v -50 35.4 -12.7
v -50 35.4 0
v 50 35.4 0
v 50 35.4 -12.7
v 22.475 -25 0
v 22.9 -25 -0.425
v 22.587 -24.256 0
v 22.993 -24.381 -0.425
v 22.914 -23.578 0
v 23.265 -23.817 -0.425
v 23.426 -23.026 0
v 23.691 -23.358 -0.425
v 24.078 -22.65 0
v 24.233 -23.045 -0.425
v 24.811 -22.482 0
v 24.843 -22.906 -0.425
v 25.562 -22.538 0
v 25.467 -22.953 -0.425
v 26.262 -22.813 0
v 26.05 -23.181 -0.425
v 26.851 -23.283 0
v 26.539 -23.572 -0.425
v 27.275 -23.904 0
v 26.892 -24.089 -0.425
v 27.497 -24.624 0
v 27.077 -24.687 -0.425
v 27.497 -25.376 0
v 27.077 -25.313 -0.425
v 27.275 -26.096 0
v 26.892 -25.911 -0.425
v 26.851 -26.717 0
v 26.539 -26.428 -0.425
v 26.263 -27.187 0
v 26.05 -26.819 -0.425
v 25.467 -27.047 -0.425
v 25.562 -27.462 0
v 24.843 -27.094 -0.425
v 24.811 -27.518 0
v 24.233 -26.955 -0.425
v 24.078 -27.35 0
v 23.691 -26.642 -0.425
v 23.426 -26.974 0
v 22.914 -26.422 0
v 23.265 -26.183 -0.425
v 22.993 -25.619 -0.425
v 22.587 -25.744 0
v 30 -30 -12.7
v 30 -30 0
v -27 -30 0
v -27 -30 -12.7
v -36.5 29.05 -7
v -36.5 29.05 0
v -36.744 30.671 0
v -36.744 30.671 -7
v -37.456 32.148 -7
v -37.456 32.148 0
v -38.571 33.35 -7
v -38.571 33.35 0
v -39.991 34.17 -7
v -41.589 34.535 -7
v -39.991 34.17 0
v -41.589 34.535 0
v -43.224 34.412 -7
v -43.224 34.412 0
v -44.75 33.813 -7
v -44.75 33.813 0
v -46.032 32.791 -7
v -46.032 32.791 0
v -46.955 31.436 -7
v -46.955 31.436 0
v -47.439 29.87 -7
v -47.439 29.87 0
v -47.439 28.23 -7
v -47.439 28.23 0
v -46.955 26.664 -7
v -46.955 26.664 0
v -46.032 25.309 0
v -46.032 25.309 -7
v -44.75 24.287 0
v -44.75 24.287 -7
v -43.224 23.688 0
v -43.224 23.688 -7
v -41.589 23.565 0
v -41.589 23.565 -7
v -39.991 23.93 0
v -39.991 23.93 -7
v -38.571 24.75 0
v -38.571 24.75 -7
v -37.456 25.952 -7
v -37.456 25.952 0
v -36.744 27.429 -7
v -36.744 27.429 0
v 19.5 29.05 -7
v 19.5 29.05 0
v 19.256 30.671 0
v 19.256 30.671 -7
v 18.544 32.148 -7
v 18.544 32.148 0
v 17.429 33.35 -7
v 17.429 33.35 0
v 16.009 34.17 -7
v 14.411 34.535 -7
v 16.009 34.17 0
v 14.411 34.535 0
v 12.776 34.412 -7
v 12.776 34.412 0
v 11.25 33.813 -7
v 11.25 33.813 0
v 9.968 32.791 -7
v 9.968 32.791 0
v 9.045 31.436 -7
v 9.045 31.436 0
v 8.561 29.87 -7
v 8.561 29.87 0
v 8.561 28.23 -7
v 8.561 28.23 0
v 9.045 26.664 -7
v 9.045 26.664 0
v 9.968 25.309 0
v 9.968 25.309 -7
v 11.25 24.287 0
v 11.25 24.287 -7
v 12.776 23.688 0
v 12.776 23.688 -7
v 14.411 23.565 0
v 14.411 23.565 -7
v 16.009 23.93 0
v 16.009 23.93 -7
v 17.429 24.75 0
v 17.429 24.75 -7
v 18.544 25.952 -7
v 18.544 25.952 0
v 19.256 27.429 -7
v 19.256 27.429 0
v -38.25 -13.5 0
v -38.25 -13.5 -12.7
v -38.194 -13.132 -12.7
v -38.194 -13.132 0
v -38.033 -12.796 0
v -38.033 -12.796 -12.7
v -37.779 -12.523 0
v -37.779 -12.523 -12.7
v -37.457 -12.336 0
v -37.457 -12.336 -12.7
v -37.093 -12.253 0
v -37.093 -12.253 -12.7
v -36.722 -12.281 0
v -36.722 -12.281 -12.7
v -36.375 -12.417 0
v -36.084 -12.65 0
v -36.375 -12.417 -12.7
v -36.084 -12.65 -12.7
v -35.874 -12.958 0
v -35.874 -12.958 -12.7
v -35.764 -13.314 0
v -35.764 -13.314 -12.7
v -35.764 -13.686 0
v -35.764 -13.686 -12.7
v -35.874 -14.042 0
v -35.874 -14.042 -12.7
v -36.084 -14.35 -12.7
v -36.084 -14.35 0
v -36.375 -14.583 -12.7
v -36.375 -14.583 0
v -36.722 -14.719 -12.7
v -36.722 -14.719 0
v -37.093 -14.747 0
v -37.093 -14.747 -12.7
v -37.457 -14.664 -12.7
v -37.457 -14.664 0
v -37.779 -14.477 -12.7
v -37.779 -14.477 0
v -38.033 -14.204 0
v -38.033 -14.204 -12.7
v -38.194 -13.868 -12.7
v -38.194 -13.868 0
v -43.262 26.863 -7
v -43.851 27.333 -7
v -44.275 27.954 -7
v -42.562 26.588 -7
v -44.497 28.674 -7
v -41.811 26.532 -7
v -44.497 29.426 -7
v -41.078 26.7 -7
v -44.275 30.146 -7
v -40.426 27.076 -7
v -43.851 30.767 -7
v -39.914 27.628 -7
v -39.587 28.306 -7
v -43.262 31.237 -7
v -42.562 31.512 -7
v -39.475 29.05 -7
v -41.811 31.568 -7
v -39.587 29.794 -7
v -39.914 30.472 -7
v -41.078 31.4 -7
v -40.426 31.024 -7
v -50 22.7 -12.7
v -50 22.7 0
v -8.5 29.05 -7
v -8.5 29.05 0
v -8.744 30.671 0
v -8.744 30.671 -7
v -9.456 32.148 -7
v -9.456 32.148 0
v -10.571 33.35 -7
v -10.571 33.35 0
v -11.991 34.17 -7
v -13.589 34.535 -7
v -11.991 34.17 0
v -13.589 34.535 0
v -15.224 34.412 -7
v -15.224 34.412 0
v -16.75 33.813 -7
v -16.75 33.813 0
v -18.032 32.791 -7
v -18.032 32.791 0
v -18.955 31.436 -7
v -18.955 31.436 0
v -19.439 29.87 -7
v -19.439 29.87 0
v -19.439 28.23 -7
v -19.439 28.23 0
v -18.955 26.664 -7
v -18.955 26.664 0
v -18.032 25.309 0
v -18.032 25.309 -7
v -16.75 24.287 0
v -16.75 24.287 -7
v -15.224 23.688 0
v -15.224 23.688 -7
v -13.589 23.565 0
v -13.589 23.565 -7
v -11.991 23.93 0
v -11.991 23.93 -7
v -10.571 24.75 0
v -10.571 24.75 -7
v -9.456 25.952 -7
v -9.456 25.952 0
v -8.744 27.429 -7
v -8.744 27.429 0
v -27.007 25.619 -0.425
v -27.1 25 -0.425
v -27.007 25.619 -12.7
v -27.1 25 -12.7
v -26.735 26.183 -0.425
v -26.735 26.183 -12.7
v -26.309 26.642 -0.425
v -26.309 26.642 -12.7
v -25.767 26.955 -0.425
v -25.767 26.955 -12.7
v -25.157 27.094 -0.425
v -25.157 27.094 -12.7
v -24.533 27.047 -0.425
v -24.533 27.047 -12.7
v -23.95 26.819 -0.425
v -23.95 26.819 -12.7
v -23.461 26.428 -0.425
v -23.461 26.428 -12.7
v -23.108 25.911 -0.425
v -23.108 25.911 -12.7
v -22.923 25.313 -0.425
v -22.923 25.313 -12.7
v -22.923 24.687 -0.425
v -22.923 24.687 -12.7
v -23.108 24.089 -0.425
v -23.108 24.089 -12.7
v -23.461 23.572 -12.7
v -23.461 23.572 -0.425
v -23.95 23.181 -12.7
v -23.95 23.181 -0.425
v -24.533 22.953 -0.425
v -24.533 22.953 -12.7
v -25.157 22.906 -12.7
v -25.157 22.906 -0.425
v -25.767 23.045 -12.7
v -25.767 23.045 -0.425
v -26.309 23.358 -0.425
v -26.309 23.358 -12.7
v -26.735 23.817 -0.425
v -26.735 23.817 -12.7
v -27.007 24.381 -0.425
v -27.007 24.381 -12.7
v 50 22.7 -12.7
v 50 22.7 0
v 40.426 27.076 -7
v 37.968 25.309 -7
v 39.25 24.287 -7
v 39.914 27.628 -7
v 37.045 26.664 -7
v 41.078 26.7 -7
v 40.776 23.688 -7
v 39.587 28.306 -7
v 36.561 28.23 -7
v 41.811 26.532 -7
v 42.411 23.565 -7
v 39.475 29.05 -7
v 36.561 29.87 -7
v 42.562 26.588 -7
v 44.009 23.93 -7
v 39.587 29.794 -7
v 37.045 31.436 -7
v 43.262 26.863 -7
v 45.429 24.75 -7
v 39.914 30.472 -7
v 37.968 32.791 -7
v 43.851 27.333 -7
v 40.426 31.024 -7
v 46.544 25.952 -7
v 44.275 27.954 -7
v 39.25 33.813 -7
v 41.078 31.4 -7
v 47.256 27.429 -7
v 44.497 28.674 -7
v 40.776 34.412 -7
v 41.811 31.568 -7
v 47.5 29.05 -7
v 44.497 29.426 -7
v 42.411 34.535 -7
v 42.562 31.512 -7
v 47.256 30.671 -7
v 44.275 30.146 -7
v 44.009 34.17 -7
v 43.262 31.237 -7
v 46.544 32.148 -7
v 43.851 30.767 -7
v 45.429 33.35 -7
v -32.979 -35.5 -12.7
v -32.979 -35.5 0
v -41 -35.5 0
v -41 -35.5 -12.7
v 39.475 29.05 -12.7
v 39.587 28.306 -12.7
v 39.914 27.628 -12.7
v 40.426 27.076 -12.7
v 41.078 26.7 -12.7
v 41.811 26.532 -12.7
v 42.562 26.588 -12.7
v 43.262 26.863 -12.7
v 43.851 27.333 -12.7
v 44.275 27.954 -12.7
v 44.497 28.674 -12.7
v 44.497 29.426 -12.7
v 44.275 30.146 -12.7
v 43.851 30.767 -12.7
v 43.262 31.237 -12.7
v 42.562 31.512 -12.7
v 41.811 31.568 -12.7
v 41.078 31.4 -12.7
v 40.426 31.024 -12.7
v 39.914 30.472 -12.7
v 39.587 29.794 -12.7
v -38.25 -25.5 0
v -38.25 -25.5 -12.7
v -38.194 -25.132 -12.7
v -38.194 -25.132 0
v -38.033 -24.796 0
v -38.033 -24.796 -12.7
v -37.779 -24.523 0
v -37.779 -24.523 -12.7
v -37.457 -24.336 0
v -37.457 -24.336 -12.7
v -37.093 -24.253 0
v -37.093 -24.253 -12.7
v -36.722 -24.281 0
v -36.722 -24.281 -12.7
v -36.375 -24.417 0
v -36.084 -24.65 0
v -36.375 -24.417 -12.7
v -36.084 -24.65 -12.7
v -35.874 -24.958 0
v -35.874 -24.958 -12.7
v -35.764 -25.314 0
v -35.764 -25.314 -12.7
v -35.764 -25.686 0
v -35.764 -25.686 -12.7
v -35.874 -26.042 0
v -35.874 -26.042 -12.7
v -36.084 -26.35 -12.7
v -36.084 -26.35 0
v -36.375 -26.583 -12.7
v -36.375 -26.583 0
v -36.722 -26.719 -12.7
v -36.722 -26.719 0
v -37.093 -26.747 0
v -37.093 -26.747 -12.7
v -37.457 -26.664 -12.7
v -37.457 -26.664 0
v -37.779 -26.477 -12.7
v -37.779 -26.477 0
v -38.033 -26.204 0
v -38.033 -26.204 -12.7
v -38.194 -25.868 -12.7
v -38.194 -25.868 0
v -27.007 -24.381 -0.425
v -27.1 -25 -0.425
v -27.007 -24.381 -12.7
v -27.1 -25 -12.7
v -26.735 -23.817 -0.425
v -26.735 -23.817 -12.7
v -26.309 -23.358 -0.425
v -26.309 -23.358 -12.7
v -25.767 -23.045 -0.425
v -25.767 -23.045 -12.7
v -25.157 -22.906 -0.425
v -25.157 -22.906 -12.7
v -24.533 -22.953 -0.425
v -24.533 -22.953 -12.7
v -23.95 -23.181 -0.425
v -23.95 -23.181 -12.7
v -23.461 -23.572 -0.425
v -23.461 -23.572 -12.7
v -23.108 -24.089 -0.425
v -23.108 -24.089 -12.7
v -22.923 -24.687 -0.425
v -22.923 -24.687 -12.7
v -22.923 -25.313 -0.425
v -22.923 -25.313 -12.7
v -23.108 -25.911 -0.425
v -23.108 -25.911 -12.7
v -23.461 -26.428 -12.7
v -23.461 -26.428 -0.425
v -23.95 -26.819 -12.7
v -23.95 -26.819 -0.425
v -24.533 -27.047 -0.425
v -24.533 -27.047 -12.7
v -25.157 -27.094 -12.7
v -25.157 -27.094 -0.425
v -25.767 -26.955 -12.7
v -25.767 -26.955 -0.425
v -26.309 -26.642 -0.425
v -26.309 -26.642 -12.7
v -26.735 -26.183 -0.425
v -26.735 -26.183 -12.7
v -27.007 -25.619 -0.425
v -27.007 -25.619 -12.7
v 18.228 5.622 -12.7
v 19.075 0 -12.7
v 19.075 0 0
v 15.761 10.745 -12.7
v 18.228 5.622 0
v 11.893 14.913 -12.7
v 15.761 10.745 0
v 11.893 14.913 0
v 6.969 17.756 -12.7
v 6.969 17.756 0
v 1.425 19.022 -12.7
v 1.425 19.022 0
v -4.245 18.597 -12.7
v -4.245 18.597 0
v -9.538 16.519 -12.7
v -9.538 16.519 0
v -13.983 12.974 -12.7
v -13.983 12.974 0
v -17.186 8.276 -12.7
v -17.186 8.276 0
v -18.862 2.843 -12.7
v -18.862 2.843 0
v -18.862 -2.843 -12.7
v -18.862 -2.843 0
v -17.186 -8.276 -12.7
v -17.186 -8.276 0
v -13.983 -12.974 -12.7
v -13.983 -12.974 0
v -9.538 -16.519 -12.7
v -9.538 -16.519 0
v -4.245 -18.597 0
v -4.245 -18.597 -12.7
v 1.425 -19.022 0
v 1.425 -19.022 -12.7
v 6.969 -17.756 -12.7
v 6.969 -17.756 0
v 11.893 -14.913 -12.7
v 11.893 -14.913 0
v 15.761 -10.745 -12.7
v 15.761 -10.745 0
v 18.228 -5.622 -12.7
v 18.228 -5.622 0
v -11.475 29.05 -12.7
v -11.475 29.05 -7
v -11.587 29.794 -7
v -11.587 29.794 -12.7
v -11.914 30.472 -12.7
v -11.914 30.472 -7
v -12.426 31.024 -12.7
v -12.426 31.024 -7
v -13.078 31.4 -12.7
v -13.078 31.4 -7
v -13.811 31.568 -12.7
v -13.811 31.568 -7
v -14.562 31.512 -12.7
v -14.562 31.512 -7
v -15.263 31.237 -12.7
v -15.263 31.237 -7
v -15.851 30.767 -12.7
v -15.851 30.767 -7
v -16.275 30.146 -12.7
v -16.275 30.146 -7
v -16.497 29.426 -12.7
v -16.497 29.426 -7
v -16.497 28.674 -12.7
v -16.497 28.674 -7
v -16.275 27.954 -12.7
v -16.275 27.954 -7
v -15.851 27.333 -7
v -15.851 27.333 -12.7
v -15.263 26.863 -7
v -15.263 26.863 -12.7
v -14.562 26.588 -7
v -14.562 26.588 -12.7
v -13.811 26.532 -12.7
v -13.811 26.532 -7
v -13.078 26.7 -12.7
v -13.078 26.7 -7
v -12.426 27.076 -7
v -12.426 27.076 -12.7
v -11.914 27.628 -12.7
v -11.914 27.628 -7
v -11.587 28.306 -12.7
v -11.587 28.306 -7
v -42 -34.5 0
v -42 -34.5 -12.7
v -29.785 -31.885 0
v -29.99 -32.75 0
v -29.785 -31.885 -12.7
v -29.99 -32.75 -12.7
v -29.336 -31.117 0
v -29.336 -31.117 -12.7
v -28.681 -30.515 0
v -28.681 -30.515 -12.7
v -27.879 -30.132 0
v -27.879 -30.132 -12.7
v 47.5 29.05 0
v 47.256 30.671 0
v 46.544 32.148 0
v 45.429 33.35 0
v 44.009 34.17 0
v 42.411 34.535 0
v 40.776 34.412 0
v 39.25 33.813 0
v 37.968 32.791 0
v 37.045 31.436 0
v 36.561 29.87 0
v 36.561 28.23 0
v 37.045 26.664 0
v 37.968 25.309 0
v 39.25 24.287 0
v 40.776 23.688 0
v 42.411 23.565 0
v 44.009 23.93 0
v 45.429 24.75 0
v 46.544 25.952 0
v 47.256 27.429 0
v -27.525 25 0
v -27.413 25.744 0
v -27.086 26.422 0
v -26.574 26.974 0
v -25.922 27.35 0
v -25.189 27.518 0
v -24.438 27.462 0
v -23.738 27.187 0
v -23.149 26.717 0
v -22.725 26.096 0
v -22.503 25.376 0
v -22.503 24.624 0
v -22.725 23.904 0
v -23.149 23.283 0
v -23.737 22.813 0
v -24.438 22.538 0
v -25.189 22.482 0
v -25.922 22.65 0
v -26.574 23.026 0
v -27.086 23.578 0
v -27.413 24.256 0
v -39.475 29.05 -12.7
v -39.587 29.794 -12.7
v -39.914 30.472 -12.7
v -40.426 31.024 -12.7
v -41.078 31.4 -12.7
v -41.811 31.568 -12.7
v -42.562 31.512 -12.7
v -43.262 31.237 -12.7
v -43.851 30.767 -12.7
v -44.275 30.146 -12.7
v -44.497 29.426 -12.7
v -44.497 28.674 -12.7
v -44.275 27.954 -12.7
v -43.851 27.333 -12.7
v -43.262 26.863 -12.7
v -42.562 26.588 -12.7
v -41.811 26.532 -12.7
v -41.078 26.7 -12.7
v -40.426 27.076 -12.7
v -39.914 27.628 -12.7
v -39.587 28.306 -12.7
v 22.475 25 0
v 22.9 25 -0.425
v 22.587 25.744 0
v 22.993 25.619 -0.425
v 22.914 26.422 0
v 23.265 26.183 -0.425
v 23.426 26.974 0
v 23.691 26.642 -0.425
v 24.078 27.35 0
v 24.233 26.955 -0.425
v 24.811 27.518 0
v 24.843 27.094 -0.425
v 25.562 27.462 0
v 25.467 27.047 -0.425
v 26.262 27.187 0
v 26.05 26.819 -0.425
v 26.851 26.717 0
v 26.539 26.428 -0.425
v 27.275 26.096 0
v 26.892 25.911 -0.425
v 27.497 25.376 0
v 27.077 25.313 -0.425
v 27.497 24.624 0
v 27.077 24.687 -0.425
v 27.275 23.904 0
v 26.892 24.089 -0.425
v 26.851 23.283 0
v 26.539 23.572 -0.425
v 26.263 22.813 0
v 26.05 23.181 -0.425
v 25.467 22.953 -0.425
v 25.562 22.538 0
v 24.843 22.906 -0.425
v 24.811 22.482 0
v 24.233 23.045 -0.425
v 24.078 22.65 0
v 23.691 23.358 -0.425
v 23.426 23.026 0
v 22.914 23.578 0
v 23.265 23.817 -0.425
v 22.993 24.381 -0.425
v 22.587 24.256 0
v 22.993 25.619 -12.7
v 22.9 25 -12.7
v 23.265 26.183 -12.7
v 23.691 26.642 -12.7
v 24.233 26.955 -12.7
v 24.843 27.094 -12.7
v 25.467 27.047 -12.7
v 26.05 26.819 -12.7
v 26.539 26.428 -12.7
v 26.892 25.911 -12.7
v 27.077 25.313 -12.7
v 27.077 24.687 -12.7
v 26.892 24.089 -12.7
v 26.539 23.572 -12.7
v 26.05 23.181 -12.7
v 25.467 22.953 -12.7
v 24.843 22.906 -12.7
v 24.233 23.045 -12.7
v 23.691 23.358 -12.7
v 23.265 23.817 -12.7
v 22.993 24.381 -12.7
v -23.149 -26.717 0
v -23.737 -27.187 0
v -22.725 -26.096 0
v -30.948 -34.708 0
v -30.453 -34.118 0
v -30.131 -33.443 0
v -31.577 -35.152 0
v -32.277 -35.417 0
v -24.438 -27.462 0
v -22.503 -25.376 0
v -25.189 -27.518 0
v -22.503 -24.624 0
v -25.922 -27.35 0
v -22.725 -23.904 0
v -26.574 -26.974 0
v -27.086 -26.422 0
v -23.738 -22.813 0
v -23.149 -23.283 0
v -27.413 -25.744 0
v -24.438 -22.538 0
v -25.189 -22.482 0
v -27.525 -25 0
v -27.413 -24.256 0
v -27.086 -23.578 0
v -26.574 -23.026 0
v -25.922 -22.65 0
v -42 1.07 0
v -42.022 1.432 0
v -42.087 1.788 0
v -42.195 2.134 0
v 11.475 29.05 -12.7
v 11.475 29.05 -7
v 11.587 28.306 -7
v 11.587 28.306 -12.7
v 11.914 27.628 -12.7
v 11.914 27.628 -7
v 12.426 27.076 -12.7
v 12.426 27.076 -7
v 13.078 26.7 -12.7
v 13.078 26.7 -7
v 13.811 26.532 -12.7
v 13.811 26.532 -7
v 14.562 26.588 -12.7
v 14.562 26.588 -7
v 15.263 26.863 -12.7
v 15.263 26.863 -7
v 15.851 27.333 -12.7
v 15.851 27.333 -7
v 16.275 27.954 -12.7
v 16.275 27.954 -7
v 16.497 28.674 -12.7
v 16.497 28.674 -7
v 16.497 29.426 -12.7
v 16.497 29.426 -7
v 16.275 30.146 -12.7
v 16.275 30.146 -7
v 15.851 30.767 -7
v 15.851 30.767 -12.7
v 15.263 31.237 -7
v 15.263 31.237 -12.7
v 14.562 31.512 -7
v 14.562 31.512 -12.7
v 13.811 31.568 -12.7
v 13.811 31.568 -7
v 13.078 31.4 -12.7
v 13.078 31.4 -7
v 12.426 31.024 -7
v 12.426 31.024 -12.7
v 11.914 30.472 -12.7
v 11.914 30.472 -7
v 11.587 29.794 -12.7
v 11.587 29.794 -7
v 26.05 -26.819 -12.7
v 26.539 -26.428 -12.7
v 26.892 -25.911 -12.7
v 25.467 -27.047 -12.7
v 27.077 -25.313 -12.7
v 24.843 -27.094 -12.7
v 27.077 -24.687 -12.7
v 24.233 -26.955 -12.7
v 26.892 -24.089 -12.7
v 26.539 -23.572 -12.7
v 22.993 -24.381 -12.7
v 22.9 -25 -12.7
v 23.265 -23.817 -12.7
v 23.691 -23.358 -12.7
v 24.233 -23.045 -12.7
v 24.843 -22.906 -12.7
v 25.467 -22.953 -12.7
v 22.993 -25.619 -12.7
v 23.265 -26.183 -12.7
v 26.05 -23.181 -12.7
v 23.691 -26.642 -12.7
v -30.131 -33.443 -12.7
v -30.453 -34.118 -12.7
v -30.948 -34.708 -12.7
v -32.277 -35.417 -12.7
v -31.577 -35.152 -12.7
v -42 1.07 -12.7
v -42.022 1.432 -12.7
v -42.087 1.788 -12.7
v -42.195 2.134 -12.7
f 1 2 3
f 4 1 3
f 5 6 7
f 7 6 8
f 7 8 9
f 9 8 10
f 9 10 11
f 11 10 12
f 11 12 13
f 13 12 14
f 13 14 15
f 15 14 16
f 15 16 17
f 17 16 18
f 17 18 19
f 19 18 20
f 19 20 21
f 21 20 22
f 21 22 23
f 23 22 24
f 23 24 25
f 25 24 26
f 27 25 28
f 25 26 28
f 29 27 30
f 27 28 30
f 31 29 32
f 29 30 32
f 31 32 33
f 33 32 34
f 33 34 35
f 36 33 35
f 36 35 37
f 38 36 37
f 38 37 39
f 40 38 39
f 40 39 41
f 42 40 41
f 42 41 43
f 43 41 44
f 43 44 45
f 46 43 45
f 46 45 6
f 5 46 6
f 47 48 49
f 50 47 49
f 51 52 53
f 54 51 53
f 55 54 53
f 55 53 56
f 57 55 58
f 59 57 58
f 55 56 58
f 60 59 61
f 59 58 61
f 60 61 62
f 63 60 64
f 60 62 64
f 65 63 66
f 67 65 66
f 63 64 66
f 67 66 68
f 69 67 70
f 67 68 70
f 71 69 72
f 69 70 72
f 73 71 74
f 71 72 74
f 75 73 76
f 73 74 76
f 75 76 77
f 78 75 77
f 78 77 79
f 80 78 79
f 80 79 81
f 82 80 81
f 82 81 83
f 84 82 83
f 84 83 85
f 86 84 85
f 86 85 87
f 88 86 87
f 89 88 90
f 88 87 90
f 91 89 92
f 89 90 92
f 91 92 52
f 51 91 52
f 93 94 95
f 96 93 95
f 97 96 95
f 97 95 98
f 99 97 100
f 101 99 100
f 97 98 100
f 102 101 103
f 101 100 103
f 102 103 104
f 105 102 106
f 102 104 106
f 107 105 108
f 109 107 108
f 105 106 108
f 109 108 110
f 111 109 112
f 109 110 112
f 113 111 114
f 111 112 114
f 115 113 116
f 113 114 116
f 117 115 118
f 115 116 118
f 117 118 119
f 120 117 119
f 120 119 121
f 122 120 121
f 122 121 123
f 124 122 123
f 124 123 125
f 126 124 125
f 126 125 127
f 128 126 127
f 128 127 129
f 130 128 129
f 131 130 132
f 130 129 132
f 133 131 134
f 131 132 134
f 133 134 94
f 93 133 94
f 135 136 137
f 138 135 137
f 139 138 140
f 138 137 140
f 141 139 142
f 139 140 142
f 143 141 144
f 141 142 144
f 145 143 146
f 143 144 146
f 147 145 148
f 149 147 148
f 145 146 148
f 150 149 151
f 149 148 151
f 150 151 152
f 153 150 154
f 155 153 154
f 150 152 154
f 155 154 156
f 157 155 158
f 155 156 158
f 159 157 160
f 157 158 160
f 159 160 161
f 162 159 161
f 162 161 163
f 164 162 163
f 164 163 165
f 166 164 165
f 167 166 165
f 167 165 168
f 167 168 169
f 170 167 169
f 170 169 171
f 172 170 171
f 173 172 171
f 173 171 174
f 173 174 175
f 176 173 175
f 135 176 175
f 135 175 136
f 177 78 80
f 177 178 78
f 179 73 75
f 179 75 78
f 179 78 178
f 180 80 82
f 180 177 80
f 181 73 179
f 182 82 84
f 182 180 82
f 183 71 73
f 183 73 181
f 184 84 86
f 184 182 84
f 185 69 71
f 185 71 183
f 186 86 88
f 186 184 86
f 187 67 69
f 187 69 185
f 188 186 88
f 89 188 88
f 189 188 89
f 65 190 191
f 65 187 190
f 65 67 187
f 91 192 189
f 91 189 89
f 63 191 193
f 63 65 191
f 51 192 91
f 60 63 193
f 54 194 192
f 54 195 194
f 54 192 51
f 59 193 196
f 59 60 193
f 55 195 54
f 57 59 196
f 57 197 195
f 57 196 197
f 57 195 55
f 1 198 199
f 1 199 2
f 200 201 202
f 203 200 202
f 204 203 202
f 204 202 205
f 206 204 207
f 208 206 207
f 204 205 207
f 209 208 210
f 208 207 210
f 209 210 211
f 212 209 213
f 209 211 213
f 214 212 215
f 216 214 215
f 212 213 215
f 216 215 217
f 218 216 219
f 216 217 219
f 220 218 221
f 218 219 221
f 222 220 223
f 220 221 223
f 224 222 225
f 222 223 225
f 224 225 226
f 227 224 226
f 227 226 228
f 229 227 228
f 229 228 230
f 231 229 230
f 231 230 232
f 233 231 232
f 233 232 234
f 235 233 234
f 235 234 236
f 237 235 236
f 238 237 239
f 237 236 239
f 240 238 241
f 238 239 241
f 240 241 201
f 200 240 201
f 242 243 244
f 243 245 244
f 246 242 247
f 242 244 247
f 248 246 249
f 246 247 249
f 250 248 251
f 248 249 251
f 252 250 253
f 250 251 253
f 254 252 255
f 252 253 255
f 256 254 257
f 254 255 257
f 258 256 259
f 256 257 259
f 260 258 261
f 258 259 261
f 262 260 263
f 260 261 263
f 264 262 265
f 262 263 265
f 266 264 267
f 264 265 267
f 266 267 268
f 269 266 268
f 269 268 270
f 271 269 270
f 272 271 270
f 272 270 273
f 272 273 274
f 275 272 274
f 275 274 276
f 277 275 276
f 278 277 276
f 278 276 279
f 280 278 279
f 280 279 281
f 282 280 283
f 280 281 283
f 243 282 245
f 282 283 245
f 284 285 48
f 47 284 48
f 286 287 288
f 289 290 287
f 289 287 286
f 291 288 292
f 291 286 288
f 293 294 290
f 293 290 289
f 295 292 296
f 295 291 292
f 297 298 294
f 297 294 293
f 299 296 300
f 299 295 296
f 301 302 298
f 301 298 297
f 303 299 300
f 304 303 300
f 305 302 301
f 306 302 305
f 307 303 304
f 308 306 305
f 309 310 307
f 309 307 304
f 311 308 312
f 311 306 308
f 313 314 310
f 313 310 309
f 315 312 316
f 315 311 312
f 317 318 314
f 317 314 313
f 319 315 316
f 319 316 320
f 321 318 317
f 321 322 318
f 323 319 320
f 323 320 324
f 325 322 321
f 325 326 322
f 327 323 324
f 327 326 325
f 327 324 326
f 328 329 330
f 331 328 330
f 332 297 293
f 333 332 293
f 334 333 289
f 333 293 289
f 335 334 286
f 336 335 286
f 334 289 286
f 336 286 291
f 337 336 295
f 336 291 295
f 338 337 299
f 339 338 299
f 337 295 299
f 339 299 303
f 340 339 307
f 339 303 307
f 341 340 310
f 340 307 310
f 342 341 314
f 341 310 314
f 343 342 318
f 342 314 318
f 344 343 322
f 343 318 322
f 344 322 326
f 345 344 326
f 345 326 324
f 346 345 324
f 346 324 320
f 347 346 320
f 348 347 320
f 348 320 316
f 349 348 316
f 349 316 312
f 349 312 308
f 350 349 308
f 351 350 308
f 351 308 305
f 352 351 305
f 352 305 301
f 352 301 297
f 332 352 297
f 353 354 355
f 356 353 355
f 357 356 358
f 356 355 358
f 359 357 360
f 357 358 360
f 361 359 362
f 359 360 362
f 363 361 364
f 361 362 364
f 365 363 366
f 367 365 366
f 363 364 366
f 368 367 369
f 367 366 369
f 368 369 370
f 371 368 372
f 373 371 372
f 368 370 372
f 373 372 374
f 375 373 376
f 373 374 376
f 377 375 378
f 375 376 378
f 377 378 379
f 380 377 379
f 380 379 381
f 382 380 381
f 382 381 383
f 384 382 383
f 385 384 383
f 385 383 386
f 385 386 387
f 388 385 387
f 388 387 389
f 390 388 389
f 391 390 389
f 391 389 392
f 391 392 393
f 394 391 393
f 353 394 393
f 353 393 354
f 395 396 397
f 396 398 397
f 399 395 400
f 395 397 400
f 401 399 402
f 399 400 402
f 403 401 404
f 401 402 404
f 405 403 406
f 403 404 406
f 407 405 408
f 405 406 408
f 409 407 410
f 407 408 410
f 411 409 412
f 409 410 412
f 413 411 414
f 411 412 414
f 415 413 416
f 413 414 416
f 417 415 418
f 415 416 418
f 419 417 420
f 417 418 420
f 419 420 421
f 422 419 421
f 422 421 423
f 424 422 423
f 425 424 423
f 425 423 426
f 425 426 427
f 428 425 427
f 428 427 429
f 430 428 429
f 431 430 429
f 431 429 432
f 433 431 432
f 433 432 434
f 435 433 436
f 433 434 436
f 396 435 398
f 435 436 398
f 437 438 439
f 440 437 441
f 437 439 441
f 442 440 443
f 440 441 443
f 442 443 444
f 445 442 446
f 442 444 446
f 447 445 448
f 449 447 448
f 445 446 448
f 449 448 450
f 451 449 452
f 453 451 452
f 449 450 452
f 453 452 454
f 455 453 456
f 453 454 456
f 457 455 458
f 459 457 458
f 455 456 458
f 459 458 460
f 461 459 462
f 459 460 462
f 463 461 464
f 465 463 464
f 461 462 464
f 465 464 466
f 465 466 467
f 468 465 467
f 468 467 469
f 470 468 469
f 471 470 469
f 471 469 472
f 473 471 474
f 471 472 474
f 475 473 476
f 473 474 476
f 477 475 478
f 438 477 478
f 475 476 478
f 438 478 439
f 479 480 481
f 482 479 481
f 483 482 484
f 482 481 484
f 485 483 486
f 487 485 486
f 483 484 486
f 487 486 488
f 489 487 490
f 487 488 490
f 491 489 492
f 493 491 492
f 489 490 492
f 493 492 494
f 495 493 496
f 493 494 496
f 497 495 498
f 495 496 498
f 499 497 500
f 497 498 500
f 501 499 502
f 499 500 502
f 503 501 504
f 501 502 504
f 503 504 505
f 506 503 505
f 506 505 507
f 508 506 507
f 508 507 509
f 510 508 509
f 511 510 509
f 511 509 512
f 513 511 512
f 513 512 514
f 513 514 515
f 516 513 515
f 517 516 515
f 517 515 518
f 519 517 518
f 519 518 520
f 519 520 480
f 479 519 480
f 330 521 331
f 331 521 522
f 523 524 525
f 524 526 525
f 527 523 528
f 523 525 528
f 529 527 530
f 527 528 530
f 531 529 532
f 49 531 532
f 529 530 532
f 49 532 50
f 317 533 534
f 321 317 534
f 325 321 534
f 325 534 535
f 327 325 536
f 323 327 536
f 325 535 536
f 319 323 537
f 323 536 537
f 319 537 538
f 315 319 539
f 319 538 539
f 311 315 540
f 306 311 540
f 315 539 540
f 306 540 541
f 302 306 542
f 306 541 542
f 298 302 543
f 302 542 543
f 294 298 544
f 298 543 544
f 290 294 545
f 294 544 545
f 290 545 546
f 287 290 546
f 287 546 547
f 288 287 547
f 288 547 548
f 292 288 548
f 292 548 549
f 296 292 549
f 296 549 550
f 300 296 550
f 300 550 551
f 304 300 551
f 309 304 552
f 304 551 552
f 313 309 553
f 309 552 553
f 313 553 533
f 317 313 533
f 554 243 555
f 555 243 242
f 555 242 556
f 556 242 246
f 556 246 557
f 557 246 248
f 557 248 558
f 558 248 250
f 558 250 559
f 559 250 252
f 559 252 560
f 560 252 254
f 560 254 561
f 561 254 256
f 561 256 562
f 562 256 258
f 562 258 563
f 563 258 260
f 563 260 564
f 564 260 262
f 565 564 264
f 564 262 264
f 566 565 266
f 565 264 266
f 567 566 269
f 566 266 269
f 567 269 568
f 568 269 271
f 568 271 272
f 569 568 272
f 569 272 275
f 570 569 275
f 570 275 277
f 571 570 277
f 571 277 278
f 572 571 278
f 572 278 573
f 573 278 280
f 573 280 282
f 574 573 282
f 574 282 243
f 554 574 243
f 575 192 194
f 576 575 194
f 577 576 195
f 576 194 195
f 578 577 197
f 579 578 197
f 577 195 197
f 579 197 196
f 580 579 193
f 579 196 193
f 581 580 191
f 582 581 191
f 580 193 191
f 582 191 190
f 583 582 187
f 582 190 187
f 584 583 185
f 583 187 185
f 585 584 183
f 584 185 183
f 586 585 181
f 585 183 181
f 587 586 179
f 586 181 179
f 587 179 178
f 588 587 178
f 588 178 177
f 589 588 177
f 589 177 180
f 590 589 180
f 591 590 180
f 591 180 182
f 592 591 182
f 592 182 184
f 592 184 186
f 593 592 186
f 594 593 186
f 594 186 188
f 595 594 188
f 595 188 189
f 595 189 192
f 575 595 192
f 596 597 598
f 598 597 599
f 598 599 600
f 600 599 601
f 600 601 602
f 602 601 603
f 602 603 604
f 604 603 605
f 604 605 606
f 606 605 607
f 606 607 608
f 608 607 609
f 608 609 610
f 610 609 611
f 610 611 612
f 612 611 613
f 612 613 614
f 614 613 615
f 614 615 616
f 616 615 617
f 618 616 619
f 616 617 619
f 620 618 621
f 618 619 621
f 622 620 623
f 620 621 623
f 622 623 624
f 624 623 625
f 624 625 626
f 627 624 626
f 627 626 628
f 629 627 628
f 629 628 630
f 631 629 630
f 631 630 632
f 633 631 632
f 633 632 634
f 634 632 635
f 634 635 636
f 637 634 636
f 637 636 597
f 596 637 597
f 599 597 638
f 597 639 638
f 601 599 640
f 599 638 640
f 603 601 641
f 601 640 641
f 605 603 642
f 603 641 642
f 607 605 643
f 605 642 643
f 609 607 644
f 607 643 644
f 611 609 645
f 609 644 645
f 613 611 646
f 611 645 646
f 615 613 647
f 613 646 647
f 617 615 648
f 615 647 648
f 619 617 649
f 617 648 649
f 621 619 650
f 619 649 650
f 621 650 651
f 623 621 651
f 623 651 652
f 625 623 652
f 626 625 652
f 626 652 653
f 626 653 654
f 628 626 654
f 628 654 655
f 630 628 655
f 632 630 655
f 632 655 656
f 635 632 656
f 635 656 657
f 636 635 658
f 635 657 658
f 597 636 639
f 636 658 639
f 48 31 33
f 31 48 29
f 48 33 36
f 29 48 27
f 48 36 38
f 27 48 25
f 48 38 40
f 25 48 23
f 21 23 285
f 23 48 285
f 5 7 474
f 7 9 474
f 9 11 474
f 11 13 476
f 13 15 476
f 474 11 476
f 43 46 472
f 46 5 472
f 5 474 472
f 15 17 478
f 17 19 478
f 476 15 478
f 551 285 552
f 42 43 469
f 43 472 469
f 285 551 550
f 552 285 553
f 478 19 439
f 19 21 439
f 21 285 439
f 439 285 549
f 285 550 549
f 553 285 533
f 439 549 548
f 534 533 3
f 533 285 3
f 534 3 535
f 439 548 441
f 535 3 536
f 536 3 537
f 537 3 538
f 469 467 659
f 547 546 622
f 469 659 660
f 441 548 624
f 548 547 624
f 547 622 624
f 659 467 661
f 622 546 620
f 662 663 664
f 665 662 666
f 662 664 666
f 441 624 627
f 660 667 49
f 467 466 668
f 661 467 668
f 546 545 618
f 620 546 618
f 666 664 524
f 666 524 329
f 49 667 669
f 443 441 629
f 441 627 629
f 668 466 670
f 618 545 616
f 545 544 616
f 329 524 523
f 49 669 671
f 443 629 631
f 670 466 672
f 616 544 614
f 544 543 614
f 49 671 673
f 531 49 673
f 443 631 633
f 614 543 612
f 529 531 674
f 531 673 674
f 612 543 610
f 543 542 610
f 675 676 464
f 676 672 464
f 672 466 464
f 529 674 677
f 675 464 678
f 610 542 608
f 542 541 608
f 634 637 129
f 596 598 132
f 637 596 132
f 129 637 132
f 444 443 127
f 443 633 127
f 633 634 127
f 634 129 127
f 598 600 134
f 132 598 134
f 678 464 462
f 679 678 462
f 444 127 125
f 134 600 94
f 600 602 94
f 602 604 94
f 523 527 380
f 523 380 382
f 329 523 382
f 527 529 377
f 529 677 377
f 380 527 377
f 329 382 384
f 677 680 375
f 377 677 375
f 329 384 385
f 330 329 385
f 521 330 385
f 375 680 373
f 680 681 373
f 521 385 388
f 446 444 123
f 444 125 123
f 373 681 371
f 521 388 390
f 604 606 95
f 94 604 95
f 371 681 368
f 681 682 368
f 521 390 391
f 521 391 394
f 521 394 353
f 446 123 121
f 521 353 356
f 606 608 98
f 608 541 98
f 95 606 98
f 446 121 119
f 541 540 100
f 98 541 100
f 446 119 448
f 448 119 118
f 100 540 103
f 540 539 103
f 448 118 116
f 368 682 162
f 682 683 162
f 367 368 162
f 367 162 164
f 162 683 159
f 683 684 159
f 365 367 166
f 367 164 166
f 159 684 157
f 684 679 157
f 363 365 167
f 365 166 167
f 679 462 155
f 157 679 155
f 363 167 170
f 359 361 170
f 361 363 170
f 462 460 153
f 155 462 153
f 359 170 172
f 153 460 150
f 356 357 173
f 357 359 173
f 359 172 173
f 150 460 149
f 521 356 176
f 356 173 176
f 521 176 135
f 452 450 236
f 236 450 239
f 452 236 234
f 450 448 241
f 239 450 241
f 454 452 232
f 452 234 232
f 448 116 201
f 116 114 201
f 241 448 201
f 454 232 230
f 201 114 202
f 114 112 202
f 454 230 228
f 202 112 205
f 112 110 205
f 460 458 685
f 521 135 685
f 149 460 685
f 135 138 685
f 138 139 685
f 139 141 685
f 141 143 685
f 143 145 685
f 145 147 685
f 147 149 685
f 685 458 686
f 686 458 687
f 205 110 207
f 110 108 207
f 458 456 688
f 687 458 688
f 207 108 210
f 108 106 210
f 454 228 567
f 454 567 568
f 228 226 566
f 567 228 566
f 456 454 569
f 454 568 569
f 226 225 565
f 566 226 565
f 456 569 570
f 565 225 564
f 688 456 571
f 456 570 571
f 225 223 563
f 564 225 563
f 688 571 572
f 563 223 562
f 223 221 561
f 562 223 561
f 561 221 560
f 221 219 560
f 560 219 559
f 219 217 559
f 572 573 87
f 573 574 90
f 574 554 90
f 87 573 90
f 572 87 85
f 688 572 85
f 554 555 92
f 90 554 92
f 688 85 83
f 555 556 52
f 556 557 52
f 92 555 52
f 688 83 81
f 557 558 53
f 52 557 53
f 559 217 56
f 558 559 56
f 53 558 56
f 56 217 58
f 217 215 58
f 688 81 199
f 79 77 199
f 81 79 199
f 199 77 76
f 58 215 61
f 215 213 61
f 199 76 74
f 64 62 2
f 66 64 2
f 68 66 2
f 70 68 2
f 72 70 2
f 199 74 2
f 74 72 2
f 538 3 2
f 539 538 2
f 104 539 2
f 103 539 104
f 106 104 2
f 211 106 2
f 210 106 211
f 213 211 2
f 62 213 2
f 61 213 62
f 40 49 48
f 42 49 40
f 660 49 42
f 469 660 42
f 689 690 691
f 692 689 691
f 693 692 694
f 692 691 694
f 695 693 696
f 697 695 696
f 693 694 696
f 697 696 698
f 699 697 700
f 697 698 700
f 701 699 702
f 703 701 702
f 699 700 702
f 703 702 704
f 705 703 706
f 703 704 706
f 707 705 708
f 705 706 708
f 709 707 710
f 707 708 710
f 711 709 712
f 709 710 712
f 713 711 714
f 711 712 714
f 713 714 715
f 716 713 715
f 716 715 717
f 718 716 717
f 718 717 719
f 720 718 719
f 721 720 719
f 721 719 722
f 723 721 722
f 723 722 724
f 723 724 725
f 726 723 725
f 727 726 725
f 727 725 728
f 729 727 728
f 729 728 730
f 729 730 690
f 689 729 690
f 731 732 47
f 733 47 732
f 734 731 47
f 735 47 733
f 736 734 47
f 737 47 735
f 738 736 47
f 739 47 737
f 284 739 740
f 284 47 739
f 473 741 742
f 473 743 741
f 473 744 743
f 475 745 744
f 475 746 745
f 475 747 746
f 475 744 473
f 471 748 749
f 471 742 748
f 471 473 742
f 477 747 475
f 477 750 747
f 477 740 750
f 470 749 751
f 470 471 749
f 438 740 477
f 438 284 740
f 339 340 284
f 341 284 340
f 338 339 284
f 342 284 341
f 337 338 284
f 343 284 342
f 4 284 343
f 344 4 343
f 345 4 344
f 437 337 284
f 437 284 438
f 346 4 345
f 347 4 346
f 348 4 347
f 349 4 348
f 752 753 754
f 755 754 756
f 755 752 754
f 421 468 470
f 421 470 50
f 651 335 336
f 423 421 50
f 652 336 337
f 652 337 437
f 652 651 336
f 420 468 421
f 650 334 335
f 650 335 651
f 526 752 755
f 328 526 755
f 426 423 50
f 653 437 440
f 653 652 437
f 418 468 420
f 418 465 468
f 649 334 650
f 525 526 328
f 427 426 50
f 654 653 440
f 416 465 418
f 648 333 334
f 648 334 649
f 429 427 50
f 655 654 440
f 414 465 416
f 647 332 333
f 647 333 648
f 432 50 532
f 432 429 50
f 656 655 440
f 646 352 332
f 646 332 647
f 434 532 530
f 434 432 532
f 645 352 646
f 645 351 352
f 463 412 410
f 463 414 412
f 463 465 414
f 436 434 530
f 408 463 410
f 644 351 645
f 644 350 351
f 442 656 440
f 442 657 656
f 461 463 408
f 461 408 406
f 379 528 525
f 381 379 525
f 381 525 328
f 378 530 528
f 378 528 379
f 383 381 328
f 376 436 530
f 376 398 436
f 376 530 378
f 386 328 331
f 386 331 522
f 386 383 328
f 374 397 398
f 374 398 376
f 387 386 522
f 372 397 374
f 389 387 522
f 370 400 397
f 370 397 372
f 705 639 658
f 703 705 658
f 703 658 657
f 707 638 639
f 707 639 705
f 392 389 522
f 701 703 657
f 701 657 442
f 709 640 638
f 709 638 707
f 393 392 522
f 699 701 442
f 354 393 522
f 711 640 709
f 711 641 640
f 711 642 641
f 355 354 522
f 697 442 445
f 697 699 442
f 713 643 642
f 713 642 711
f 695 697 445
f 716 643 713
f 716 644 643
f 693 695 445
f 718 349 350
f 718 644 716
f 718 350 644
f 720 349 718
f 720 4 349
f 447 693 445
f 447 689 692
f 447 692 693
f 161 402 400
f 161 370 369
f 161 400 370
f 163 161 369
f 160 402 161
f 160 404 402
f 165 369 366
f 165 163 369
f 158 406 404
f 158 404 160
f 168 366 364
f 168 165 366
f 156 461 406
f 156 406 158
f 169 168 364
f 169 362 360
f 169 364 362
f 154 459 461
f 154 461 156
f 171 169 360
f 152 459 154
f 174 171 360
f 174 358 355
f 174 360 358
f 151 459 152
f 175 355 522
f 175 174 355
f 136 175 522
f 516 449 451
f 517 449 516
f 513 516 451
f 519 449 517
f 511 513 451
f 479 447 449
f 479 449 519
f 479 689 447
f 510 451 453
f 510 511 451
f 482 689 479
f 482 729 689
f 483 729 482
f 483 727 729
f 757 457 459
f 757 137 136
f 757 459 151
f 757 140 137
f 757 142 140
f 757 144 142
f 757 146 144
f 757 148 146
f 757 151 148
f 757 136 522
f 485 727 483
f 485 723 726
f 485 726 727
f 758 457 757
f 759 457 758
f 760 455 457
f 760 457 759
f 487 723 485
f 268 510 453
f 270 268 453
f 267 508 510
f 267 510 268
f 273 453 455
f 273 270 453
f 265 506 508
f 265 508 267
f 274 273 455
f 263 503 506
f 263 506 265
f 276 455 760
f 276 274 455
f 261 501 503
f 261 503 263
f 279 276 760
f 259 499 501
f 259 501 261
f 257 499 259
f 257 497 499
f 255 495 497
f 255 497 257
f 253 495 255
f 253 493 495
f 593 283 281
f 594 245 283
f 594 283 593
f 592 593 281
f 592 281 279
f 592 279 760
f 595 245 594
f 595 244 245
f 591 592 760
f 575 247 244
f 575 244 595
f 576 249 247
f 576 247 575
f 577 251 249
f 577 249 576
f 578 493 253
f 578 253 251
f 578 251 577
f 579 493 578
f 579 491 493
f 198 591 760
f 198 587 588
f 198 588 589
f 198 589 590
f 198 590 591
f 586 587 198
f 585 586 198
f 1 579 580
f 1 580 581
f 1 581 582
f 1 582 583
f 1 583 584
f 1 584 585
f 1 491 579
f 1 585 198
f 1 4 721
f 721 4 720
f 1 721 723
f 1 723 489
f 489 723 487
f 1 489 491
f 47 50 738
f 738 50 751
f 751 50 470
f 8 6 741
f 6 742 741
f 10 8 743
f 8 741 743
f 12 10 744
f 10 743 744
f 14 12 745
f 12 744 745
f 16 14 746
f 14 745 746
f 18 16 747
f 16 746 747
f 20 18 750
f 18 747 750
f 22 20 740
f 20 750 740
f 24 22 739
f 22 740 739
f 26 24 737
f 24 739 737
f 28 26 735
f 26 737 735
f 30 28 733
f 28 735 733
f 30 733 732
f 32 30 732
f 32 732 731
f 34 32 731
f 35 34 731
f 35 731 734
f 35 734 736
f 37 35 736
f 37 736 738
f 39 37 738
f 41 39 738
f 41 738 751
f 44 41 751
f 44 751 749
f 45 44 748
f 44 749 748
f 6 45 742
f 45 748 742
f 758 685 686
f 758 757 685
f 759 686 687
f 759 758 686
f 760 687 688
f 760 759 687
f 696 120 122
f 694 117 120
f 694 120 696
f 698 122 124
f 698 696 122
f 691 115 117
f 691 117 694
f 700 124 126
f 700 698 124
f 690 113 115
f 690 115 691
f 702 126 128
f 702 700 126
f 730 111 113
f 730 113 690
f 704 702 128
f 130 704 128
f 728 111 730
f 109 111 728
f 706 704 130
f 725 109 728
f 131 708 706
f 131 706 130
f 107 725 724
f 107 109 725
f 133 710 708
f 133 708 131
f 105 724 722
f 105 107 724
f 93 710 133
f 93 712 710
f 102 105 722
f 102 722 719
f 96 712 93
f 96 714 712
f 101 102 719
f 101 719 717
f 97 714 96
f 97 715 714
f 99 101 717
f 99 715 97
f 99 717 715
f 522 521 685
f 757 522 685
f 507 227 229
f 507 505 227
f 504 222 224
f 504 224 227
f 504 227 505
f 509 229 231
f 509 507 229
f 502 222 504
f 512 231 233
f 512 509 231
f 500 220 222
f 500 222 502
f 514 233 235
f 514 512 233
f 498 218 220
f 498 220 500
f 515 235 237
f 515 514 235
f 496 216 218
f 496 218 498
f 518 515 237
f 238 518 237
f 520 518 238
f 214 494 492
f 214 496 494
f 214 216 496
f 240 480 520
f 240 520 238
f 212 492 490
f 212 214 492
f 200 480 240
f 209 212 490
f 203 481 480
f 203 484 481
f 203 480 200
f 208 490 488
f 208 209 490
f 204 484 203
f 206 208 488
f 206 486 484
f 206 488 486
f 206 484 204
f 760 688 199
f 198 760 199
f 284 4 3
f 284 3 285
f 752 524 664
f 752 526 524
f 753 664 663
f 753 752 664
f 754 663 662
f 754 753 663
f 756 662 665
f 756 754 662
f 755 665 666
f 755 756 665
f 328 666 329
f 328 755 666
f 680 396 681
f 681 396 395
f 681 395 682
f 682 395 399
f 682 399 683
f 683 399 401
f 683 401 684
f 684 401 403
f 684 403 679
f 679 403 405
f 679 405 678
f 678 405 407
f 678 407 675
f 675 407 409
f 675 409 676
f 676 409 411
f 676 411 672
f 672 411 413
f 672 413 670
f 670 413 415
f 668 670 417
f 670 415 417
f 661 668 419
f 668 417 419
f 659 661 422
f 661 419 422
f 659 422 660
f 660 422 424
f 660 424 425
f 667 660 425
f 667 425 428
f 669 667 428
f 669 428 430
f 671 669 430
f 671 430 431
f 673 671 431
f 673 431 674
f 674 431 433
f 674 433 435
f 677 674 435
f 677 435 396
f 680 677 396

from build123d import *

# Parameters (mm, degrees)
SKETCH3_R                       = 19.075
SKETCH3_R_2                     = 2.525
BOSS_EXTRUDE1_DEPTH             = 12.7
M5X0_8_TAPPED_HOLE1_D           = 4.2
M5X0_8_TAPPED_HOLE1_CSINK_D     = 5.05
M5X0_8_TAPPED_HOLE1_CSINK_ANGLE = 90
SKETCH8_R                       = 5.5
CUT_EXTRUDE1_DEPTH              = 7
BOSS_EXTRUDE2_DEPTH             = 12.7
FILLET1_R                       = 3
FILLET2_R                       = 3
CHAMFER1_SIZE                   = 1
M3X0_5_TAPPED_HOLE2_D           = 2.5


with BuildPart() as part:
    # Sketch3 → Boss-Extrude1 (new body)
    with BuildSketch(Plane.XY):
        Polygon((-50, 35.4), (50, 35.4), (50, 22.7), (30, -30), (-30, -30), (-50, 22.7), align=None)
        Circle(SKETCH3_R, mode=Mode.SUBTRACT)
        with Locations((-42, 29.05)):
            Circle(SKETCH3_R_2, mode=Mode.SUBTRACT)
        with Locations(Location((42, 29.05, 0), (0, 0, 180))):
            Circle(SKETCH3_R_2, mode=Mode.SUBTRACT)
        with Locations((-14, 29.05)):
            Circle(SKETCH3_R_2, mode=Mode.SUBTRACT)
        with Locations(Location((14, 29.05, 0), (0, 0, 180))):
            Circle(SKETCH3_R_2, mode=Mode.SUBTRACT)
    extrude(amount=-BOSS_EXTRUDE1_DEPTH)

    # M5x0.8 Tapped Hole1 (through all)
    with Locations(Plane.XY):
        with Locations((-25, 25), (25, 25), (25, -25), (-25, -25)):
            CounterSinkHole(M5X0_8_TAPPED_HOLE1_D / 2, M5X0_8_TAPPED_HOLE1_CSINK_D / 2, counter_sink_angle=M5X0_8_TAPPED_HOLE1_CSINK_ANGLE)

    # Sketch8 → Cut-Extrude1 (cut)
    with BuildSketch(Plane.XY):
        with Locations((-42, 29.05)):
            Circle(SKETCH8_R)
        with Locations((-14, 29.05)):
            Circle(SKETCH8_R)
        with Locations((14, 29.05)):
            Circle(SKETCH8_R)
        with Locations((42, 29.05)):
            Circle(SKETCH8_R)
    extrude(amount=-CUT_EXTRUDE1_DEPTH, mode=Mode.SUBTRACT)

    # Sketch9 → Boss-Extrude2 (add)
    with BuildSketch(Plane.XY):
        Polygon((-30, -30), (-30, -35.5), (-42, -35.5), (-42, 1.62), align=None)
    extrude(amount=-BOSS_EXTRUDE2_DEPTH)

    # Fillet1
    fillet1_edges = [part.edges().sort_by_distance(p)[0] for p in [
        (-30, -30, -6.35),
        (-42, 1.62, -6.35),
    ]]
    fillet(fillet1_edges, radius=FILLET1_R)

    # Fillet2
    fillet2_edges = [part.edges().sort_by_distance(p)[0] for p in [
        (-30, -35.5, -6.35),
    ]]
    fillet(fillet2_edges, radius=FILLET2_R)

    # Chamfer1
    chamfer1_edges = [part.edges().sort_by_distance(p)[0] for p in [
        (-42, -35.5, -6.35),
    ]]
    chamfer(chamfer1_edges, length=CHAMFER1_SIZE)

    # M3x0.5 Tapped Hole2 (through all)
    with Locations(Plane.XY):
        with Locations((-37, -13.5), (-37, -25.5)):
            Hole(M3X0_5_TAPPED_HOLE2_D / 2)


solid = part.part
